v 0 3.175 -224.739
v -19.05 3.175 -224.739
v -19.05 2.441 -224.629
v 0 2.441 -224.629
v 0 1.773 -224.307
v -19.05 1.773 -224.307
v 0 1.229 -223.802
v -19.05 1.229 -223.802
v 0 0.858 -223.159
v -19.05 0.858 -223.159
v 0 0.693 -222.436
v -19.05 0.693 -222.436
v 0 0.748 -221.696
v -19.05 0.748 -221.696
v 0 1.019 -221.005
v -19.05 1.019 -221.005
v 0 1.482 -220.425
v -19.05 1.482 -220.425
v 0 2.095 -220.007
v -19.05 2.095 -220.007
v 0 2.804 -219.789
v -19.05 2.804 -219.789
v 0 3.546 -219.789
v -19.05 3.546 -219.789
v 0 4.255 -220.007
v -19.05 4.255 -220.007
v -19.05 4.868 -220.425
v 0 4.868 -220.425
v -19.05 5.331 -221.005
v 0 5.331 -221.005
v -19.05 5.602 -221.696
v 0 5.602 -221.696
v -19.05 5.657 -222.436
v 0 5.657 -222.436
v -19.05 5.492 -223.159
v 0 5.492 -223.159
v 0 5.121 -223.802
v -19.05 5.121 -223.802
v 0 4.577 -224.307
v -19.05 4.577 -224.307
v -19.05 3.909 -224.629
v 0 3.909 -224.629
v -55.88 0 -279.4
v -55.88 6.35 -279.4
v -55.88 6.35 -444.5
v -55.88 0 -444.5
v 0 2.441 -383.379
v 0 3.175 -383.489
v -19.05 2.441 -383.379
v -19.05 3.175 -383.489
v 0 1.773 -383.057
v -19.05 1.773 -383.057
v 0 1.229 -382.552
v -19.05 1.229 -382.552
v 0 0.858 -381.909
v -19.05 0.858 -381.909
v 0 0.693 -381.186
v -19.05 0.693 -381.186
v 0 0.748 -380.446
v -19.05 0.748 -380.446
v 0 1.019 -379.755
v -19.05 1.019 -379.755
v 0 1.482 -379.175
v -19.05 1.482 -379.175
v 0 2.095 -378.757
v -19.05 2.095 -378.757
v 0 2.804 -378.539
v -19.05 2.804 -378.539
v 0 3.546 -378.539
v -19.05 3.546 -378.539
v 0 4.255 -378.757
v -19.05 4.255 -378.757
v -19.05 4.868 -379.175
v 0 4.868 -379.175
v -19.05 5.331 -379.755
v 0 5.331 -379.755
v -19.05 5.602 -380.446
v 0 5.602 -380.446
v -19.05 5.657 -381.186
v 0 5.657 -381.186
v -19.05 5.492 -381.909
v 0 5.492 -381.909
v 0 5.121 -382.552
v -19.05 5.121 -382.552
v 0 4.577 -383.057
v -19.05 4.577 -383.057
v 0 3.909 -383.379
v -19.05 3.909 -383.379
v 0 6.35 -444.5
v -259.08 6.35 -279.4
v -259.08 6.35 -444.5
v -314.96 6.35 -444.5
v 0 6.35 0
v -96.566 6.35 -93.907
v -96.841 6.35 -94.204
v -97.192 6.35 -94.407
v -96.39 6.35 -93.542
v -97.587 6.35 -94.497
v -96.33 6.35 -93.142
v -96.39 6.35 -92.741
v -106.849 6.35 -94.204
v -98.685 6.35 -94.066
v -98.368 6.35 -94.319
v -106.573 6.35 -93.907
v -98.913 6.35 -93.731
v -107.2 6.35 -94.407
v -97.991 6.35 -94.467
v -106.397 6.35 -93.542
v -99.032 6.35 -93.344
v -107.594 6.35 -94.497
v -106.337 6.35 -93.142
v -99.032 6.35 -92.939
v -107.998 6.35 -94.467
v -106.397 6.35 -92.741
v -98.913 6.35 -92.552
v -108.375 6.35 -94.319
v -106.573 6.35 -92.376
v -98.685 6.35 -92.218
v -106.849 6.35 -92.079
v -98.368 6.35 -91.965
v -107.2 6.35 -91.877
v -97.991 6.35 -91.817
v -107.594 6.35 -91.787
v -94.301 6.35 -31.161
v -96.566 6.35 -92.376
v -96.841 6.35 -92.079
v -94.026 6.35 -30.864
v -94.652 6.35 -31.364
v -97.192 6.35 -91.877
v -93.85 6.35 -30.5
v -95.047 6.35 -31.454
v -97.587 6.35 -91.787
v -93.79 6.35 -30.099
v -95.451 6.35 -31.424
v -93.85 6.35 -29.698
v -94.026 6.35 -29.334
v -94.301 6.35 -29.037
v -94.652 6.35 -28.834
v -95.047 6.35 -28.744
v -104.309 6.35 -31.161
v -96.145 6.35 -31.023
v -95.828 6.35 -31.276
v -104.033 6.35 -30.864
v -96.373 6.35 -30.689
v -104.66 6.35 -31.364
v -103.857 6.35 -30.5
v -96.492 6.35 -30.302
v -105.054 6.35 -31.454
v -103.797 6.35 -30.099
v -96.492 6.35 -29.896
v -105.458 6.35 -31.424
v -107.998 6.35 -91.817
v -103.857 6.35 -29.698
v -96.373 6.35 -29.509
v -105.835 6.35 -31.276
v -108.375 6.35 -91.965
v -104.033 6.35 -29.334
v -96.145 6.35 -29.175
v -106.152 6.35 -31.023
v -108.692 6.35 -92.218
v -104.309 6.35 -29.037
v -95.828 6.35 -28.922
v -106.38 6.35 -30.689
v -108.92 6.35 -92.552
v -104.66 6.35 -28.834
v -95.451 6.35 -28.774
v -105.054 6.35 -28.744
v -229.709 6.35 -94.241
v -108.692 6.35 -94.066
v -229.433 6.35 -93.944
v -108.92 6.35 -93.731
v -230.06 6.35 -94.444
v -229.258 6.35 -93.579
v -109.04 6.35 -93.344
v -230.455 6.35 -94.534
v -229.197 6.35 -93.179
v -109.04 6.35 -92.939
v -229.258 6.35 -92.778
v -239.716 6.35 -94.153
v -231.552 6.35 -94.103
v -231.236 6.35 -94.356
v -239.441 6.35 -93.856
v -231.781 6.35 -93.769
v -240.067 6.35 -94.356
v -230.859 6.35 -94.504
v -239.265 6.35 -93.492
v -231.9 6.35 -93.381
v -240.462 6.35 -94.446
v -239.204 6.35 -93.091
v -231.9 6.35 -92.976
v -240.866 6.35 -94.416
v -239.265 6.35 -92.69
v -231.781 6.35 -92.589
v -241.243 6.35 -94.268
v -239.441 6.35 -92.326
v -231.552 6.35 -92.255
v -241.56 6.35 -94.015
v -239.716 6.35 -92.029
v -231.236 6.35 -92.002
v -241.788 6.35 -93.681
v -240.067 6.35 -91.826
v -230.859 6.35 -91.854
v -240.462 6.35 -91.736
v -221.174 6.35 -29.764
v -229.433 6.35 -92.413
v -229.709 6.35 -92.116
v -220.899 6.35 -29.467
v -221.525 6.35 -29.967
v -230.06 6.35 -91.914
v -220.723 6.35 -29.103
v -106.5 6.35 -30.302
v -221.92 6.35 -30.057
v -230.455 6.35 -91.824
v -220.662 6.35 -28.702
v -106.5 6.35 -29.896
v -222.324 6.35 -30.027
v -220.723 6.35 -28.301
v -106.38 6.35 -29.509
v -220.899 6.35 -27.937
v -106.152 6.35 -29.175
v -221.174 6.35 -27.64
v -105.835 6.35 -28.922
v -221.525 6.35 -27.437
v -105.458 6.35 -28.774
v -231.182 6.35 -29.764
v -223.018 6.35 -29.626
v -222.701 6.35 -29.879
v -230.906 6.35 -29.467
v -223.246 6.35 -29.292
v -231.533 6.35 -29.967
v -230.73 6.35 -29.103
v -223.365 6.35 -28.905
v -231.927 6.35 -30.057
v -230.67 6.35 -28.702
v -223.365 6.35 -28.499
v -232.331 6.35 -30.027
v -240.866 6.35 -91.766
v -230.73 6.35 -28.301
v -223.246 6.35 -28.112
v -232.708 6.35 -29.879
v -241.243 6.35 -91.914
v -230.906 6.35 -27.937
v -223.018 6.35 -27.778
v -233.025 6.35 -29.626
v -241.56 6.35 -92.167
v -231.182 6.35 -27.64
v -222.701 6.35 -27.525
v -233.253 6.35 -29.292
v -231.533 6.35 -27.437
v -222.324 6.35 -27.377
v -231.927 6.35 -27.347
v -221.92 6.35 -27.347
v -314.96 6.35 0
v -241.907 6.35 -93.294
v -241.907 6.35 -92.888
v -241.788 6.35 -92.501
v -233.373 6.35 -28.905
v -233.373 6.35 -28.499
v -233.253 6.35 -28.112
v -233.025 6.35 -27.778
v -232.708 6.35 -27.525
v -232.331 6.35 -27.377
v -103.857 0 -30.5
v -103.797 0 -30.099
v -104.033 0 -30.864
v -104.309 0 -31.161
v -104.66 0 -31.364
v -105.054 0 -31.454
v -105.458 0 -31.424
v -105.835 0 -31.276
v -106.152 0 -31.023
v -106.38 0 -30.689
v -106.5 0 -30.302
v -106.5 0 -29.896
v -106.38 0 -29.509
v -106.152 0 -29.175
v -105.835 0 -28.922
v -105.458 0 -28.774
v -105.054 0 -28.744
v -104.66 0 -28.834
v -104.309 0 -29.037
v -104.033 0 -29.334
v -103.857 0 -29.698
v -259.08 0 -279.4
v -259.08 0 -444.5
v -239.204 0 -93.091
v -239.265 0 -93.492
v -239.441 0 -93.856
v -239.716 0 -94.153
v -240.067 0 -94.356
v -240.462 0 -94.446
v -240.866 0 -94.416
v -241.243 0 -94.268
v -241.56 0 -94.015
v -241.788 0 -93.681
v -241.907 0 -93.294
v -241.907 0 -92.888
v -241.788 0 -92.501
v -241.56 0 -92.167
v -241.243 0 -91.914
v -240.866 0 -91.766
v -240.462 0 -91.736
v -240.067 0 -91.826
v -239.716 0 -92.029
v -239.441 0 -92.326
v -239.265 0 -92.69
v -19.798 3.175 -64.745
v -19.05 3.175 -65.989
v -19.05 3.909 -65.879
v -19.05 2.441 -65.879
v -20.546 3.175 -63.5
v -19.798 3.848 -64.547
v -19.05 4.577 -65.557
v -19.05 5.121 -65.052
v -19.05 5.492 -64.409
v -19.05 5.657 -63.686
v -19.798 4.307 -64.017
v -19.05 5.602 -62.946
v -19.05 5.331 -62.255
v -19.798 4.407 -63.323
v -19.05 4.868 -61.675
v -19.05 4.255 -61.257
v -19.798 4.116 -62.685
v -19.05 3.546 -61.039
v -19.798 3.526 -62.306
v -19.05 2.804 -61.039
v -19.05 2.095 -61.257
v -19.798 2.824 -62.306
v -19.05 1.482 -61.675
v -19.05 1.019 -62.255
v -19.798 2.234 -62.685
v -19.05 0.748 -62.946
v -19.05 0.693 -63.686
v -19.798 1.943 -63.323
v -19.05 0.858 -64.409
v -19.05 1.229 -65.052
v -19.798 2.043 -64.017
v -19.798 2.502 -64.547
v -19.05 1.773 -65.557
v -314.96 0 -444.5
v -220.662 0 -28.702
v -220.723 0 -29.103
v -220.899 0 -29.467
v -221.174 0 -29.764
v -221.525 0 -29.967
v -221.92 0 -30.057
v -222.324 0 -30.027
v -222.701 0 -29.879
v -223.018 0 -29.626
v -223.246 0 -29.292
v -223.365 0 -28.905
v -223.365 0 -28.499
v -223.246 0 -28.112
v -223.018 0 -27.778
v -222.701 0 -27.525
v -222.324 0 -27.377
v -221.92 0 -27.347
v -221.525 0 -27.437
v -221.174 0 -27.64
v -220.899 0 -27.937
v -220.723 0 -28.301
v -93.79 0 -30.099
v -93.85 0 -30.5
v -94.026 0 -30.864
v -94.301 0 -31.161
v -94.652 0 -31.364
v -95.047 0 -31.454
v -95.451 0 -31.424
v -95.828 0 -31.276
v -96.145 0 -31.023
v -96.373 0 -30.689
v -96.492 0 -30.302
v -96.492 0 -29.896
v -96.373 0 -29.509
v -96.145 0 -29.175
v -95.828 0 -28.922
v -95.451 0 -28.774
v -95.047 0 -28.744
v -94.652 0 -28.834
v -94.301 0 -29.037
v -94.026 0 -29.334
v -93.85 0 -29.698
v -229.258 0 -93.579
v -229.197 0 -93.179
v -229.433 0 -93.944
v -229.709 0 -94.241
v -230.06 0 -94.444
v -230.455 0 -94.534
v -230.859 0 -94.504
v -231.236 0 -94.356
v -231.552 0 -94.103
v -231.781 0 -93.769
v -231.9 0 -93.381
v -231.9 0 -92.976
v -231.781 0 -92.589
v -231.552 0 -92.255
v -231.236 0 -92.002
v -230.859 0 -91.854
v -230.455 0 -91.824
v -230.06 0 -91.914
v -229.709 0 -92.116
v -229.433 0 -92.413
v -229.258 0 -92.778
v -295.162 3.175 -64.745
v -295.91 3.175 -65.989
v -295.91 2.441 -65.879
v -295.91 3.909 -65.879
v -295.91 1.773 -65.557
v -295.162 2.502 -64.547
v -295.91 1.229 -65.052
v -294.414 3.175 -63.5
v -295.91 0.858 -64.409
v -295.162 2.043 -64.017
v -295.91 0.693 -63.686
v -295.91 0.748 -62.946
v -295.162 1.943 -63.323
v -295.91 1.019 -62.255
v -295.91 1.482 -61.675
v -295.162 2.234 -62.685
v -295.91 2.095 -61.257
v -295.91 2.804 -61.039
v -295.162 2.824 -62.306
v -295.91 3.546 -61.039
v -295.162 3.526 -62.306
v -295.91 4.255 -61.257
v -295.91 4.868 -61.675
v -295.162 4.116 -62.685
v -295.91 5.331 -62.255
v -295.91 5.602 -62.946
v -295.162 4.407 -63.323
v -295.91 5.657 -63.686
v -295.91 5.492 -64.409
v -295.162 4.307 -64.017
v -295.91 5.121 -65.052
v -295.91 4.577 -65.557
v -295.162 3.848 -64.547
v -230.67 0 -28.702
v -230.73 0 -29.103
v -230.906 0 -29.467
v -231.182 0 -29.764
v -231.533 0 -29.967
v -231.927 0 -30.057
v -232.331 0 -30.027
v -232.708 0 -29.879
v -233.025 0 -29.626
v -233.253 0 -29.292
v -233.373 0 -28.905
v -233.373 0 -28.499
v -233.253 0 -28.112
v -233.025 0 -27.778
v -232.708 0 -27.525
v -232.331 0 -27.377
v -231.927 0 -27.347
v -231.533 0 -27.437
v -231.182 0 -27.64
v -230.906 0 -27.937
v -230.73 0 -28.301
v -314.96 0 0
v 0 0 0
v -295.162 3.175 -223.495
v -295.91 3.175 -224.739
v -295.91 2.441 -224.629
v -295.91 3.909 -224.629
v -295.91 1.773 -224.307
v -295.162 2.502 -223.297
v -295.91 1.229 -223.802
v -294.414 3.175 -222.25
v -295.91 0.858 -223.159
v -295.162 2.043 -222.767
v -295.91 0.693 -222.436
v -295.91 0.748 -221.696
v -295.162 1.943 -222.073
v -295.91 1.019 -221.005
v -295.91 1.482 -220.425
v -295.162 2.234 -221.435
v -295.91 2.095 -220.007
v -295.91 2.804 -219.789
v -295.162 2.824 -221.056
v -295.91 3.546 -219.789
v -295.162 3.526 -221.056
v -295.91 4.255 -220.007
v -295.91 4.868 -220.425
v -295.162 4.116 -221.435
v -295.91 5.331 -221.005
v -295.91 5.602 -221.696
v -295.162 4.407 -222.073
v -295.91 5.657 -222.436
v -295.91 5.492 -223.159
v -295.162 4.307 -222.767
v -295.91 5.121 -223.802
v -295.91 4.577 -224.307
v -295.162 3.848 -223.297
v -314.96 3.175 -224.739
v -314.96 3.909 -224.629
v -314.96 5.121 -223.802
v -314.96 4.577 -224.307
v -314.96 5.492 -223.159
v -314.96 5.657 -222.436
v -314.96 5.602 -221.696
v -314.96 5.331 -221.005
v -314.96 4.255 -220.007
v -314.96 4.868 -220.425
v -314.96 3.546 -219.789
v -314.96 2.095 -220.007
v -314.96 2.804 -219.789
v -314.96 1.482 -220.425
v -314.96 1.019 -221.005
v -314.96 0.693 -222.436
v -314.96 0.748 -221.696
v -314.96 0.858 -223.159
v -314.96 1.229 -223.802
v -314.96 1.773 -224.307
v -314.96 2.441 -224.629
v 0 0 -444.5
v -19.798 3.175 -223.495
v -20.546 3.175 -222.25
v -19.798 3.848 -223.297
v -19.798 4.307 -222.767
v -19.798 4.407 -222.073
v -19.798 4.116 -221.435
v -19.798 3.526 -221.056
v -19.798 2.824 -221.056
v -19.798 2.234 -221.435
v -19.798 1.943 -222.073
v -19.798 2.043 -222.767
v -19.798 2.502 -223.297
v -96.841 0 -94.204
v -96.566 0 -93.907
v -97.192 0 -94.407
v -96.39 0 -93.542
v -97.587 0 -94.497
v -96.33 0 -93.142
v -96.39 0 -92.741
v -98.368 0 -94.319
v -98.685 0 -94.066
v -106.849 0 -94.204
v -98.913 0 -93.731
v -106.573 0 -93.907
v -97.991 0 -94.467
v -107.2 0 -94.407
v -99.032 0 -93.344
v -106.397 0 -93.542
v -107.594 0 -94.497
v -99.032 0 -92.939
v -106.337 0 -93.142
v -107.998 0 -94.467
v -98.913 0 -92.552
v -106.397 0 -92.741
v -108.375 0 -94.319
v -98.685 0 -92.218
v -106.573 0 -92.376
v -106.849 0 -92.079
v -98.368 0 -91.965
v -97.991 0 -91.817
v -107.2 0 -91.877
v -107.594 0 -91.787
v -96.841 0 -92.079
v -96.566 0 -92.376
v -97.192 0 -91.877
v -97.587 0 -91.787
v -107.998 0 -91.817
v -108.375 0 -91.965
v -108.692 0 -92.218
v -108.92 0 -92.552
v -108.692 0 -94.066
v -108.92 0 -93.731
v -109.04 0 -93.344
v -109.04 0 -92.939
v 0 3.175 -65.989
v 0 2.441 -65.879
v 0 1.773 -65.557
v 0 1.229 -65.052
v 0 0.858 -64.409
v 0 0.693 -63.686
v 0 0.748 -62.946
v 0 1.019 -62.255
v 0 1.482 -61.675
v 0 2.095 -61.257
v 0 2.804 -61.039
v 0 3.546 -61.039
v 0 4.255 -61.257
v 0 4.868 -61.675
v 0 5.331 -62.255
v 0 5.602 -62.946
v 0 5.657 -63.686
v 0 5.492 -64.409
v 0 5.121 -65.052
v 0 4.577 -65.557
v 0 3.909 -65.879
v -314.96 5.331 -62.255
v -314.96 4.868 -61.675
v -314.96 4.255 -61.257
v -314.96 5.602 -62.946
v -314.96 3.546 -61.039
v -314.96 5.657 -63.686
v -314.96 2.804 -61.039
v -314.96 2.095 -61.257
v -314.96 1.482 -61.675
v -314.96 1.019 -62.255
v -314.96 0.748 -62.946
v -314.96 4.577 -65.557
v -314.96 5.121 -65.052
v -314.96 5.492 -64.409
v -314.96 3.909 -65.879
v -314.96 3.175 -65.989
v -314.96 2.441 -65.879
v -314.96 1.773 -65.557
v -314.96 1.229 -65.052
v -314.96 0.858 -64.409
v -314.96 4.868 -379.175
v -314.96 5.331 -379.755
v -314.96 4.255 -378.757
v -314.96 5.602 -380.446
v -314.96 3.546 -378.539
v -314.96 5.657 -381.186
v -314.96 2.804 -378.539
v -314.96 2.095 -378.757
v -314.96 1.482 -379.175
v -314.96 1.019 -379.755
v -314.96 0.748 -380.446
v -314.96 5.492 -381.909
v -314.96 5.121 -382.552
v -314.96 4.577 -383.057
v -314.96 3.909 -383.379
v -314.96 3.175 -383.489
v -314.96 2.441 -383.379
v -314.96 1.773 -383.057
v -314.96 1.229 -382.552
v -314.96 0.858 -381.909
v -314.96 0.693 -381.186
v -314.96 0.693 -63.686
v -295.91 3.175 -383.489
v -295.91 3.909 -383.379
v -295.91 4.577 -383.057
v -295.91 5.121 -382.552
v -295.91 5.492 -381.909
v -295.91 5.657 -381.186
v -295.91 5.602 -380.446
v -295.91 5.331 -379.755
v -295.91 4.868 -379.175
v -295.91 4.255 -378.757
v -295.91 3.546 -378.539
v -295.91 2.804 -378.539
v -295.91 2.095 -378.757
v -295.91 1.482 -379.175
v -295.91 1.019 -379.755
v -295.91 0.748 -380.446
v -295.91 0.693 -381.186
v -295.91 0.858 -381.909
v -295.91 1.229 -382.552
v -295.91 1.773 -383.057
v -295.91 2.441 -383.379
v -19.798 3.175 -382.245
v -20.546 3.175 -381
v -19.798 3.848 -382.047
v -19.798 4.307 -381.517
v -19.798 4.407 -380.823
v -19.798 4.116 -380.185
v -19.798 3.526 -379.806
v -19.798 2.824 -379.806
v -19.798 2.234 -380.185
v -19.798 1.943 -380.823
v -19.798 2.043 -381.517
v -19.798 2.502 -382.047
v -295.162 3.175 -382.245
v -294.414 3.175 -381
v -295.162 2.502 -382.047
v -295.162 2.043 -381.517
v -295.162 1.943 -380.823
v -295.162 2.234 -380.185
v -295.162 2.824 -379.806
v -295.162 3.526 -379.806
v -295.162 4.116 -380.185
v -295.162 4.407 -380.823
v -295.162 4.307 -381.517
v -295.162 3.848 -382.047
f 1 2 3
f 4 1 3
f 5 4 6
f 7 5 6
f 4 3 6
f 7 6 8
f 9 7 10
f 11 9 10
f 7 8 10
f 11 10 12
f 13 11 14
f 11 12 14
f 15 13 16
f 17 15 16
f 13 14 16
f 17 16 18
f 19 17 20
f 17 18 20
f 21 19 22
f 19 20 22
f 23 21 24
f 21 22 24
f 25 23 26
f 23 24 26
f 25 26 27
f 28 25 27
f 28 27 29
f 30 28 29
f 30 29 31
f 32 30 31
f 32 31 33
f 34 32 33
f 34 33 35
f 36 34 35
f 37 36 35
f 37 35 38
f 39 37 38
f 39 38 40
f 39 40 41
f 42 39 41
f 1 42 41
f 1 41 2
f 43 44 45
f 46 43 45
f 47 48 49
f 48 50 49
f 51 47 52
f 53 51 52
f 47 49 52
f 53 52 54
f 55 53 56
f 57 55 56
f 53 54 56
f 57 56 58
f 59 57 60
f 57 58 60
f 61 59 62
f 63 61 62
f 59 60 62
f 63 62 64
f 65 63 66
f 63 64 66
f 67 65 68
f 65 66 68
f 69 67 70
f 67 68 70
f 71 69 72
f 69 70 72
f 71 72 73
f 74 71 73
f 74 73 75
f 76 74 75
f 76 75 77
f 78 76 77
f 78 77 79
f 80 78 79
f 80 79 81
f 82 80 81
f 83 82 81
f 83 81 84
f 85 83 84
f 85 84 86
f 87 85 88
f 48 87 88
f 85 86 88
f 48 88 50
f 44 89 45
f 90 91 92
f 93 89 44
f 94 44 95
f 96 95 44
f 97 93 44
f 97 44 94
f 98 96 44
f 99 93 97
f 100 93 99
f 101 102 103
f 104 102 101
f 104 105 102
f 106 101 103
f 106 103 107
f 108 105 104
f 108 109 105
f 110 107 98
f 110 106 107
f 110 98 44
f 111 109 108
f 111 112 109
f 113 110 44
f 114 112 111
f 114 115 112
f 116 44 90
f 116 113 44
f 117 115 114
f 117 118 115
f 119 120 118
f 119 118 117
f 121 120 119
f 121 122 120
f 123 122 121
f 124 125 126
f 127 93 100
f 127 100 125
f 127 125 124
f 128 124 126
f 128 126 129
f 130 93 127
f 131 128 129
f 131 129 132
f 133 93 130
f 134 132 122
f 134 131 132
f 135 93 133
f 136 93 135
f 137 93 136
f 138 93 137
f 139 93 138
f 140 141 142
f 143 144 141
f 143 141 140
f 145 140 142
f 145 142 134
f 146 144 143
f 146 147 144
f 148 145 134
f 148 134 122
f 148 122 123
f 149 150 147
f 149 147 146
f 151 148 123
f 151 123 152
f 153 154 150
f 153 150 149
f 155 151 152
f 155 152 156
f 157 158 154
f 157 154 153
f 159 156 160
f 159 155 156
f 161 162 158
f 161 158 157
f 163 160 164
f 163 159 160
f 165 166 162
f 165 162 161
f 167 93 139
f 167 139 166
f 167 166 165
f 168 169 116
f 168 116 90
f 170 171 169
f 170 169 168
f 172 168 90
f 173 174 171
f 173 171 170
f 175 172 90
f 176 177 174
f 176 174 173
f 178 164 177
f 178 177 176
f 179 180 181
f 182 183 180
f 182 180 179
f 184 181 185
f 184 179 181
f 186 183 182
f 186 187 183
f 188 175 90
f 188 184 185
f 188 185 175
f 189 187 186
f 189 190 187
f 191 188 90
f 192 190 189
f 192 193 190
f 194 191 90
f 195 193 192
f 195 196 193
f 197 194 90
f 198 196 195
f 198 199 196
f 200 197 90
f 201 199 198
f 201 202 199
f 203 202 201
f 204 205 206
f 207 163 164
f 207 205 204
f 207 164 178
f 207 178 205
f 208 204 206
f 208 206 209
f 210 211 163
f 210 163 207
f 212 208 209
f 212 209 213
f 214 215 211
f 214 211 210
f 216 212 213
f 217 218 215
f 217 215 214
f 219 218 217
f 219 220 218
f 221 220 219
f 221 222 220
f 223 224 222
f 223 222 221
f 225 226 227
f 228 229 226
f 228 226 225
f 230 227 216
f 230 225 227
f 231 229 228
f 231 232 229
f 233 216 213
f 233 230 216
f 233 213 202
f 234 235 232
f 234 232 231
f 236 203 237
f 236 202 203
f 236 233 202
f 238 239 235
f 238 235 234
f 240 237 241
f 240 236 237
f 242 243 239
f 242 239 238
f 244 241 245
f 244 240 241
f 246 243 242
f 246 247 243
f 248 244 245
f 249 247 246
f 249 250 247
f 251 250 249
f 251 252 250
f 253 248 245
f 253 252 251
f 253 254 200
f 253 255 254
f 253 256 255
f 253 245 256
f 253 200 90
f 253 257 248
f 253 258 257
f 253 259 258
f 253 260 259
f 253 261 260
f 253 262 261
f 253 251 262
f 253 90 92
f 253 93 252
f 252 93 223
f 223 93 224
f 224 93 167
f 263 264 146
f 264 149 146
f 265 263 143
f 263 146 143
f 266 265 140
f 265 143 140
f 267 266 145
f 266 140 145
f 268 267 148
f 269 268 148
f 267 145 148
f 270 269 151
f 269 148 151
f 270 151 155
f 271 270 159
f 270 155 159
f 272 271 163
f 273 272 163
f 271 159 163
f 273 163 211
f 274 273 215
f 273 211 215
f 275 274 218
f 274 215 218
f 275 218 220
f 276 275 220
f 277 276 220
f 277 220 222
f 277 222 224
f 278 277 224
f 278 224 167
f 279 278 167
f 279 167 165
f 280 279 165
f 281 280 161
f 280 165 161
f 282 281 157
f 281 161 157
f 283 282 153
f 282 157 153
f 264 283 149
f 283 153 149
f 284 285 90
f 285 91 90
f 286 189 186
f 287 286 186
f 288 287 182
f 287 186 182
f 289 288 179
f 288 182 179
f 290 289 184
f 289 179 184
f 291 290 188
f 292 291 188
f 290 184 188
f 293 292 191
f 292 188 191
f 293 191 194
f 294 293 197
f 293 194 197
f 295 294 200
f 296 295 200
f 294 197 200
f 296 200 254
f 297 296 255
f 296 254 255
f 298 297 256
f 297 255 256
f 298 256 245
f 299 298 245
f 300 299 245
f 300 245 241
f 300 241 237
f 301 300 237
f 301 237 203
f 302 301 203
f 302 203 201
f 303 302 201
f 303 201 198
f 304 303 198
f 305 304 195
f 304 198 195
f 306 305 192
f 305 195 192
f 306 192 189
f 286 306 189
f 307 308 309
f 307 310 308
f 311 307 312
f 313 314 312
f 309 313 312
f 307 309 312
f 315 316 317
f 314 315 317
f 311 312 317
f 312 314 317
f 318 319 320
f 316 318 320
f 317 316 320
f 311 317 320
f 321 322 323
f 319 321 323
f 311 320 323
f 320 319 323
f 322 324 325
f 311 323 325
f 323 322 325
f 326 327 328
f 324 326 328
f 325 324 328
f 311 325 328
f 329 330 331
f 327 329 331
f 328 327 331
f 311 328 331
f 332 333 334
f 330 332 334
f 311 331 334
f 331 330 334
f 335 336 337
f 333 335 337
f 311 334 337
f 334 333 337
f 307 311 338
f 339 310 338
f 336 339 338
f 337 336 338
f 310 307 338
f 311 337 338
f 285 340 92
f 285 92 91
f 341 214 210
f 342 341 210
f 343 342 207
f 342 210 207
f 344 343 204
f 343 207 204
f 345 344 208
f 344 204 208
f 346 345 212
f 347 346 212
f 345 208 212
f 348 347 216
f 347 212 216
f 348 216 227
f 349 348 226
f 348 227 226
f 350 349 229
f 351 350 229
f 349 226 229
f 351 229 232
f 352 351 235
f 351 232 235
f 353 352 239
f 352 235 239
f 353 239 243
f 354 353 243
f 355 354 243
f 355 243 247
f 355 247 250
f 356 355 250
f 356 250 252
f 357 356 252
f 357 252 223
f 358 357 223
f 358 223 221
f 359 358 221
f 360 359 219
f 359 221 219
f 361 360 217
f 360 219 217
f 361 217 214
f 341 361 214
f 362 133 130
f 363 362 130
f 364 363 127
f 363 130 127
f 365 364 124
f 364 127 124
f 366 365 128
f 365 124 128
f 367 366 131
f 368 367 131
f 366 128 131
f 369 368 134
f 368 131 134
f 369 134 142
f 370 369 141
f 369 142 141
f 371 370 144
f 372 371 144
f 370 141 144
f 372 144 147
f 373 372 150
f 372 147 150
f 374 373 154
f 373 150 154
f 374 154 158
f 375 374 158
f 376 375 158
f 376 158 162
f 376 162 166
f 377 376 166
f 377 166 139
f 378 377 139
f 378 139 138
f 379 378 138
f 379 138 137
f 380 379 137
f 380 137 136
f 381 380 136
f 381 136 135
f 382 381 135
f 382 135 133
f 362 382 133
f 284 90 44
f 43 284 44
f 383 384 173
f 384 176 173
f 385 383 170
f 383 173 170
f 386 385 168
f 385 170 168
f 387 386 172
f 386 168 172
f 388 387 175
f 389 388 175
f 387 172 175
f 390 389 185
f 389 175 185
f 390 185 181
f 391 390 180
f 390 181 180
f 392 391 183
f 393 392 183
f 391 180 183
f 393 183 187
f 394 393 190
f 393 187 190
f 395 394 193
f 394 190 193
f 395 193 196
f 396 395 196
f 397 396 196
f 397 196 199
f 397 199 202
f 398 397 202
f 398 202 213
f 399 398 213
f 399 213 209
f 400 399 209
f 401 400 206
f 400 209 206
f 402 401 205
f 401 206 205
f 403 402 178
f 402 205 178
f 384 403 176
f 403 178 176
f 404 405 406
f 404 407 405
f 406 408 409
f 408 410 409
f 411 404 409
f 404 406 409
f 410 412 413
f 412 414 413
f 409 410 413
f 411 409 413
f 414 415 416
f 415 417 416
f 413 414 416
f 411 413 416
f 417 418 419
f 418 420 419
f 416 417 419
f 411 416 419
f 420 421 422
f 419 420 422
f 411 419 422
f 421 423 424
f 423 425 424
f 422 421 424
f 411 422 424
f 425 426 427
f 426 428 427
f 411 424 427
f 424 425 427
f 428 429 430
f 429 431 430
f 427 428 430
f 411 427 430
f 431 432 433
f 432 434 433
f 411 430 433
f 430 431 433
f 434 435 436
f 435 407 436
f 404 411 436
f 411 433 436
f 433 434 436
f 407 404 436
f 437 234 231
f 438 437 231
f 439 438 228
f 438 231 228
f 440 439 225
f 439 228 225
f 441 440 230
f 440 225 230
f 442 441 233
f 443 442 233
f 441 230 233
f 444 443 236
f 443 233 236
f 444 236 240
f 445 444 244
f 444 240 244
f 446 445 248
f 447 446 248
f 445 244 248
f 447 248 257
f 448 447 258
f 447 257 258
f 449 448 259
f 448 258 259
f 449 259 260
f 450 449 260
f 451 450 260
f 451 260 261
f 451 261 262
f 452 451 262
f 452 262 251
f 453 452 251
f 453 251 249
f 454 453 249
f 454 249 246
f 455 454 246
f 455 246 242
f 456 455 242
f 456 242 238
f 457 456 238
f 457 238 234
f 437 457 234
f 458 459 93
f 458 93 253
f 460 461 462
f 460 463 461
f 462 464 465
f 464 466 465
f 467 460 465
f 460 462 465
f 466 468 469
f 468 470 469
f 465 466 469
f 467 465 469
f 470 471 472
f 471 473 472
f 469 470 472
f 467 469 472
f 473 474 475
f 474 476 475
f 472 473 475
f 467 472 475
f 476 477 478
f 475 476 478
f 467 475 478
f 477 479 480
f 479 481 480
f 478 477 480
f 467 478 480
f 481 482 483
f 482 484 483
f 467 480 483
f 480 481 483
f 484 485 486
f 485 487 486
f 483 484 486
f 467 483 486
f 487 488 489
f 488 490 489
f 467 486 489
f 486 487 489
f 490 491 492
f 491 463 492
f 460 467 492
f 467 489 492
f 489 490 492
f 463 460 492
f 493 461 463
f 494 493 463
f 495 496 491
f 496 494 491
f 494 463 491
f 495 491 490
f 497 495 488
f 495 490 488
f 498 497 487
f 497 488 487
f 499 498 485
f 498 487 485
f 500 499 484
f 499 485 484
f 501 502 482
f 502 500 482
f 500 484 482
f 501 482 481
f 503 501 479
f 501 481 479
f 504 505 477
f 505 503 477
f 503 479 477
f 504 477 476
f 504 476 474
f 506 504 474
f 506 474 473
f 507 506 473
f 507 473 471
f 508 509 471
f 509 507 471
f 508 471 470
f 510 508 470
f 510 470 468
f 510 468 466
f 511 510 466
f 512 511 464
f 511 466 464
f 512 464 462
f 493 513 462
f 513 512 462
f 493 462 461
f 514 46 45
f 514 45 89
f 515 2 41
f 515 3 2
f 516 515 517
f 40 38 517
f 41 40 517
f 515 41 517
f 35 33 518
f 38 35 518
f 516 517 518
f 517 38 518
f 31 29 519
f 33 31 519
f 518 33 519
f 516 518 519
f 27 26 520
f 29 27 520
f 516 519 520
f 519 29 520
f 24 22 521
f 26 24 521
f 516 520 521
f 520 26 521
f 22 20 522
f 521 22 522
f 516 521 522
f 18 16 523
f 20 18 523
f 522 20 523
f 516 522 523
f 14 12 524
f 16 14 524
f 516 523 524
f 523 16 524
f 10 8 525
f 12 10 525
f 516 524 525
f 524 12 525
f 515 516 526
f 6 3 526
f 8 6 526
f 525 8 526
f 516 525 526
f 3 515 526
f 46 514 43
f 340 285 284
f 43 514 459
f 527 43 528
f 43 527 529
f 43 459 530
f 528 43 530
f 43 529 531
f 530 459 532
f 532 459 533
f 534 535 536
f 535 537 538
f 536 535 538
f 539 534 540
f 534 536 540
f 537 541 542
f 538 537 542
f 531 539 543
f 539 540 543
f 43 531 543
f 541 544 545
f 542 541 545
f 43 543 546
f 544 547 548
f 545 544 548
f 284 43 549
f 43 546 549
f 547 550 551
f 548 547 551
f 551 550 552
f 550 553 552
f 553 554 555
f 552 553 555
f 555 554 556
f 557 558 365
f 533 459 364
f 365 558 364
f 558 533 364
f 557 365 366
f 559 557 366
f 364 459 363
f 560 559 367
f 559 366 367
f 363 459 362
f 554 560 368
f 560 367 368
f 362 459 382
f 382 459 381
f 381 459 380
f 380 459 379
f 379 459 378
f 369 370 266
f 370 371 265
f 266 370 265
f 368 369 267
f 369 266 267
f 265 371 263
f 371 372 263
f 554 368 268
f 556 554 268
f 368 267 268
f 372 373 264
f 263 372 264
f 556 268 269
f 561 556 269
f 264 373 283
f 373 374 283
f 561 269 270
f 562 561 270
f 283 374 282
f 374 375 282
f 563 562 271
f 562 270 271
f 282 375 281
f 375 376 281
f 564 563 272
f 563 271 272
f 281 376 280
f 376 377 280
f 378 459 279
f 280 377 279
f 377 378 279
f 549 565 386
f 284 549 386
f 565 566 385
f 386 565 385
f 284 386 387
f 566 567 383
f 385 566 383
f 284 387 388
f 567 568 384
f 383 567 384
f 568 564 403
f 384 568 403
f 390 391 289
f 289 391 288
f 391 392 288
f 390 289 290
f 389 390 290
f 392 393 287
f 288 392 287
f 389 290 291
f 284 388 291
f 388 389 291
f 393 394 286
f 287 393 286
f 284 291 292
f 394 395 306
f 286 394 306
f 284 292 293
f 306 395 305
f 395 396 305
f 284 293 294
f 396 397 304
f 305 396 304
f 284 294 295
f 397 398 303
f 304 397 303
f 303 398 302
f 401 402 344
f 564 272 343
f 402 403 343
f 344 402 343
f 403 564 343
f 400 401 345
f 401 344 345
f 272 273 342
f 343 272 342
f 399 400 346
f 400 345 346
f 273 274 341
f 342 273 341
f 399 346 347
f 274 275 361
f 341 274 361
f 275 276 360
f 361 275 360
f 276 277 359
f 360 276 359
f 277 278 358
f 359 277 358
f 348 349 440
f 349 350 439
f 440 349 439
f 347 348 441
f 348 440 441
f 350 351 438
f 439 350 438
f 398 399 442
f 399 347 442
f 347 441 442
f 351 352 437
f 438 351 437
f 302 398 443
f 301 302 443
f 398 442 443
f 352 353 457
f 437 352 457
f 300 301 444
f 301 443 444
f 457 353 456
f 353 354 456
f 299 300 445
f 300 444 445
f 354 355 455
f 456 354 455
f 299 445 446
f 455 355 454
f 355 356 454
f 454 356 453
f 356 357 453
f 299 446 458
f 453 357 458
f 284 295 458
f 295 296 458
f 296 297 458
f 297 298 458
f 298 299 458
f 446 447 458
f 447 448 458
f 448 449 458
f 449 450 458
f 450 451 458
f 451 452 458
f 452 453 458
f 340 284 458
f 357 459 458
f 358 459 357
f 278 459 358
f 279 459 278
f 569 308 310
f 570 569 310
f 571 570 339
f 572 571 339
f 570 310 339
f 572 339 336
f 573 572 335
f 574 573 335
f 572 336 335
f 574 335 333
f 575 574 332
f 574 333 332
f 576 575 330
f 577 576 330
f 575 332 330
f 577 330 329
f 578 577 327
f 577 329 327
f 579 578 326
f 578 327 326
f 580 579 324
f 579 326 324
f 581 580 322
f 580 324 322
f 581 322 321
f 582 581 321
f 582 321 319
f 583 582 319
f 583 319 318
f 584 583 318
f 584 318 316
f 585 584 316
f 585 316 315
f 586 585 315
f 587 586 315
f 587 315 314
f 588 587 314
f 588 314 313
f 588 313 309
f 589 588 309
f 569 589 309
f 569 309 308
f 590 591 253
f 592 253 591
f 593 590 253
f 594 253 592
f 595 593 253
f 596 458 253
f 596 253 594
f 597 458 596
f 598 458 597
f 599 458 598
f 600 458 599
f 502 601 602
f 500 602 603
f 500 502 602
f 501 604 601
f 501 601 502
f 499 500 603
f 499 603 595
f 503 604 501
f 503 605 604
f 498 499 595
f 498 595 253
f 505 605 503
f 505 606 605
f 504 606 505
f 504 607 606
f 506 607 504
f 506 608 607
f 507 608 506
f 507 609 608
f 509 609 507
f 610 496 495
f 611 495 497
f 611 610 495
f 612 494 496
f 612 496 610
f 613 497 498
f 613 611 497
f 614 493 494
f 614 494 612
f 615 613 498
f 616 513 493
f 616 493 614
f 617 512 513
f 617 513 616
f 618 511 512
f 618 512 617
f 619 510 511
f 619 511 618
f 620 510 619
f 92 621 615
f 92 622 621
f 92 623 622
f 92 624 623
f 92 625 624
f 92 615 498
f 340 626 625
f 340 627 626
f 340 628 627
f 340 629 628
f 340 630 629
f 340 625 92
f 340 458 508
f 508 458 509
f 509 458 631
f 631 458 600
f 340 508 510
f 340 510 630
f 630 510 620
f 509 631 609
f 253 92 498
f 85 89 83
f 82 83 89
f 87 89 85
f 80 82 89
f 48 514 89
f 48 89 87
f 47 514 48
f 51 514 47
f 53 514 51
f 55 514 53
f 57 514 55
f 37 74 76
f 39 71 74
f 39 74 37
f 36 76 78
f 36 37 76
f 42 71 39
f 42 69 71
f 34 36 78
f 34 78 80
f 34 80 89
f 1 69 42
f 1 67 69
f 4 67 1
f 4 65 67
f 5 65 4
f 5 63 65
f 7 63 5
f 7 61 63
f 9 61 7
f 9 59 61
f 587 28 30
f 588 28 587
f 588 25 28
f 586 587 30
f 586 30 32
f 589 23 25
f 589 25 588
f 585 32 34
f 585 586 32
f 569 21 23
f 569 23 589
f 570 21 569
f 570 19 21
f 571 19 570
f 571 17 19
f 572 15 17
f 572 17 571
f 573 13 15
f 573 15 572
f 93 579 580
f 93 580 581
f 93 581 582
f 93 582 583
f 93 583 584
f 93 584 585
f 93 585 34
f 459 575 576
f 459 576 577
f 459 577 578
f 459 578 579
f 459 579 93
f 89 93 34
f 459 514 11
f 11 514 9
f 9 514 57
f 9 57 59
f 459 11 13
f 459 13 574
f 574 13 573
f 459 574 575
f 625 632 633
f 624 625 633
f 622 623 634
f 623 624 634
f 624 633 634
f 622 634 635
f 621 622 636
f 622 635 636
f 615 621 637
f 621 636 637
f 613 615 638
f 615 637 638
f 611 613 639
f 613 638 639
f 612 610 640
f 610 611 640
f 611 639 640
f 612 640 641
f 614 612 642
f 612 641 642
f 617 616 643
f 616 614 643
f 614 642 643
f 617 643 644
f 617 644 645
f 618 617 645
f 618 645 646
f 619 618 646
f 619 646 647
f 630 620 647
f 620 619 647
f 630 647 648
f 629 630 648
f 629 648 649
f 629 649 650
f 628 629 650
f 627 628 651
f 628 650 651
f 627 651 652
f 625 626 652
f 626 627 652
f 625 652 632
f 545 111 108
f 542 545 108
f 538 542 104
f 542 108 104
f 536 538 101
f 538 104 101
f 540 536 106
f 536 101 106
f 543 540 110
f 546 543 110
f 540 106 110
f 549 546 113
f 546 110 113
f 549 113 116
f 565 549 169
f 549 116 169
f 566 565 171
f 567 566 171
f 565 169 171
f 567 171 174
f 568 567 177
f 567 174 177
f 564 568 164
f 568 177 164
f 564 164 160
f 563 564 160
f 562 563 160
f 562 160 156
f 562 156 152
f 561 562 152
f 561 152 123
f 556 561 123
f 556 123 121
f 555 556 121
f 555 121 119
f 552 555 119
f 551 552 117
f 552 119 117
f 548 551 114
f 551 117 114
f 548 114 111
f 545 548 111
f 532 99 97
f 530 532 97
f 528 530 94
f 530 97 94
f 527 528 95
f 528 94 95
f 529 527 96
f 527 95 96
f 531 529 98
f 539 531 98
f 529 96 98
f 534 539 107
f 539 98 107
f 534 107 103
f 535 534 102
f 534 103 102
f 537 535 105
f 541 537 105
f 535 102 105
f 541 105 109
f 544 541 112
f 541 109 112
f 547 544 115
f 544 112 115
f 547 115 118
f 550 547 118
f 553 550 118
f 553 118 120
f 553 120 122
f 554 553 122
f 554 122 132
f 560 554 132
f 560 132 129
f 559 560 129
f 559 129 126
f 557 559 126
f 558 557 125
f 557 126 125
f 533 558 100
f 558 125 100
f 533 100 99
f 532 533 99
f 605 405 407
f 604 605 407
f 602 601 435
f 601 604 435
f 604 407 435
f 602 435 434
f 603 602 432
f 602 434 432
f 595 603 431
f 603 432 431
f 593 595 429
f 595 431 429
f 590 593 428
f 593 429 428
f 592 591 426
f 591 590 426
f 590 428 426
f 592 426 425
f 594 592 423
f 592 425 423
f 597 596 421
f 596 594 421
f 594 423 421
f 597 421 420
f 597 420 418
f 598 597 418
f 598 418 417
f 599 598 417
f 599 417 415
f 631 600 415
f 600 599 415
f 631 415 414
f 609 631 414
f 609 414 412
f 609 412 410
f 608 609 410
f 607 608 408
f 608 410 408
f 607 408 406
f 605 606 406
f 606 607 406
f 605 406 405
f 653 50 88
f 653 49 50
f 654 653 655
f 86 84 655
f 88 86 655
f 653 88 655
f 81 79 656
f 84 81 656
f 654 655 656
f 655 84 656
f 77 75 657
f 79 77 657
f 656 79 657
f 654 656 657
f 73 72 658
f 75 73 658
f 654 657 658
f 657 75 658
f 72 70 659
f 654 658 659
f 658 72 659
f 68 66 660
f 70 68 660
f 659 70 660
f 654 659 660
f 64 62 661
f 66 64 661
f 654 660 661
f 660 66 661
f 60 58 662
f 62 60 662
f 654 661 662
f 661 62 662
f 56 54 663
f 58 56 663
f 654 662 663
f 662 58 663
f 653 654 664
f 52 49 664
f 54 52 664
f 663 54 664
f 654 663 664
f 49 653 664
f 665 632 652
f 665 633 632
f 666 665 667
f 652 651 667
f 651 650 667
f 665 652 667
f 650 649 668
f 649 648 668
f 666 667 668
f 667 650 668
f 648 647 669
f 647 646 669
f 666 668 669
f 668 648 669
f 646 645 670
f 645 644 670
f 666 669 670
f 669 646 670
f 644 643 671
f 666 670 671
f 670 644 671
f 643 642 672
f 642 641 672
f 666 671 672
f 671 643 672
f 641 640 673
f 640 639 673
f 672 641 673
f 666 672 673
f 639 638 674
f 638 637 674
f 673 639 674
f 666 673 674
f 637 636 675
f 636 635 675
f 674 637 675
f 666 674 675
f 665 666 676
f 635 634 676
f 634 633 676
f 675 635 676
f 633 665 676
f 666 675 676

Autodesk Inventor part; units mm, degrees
ref_plane "YZ Plane" through (0, 0, 0) normal (1, 0, 0) x (0, 1, 0)
ref_plane "XZ Plane" through (0, 0, 0) normal (0, 1, 0) x (-1, 0, 0)
ref_plane "XY Plane" through (0, 0, 0) normal (0, 0, 1) x (1, 0, 0)
sketch "Sketch1" plane through (0, 0, 0) normal (0, 1, 0) x (-1, 0, 0)
  line L0 (0, 0) -> (314.96, 0)
  line L1 (314.96, 0) -> (314.96, -444.5)
  line L2 (314.96, -444.5) -> (0, -444.5)
  line L3 (0, -444.5) -> (0, 0)
  dimension "d0" = 314.96
  dimension "d1" = 444.5
extrude "Extrusion1" add sketch "Sketch1" along normal blind 6.35
sketch "Sketch2" plane through (0, 6.35, 0) normal (0, 1, 0) x (1, 0, 0)
  circle A0 centre (-95.1484, 30.099) radius 1.3589
  circle A1 centre (-105.156, 30.099) radius 1.3589
  line L0 (-314.96, 0) -> (0, 0) projected
  line L1 (0, 0) -> (0, 444.5) projected
  dimension "d4" = 2.7178
  dimension "d5" = 2.7178
  dimension "d7" = 95.1484
  dimension "d8" = 10.0076
  dimension "d9" = 30.099
  dimension "d37" = 30.099
extrude "Extrusion2" cut sketch "Sketch2" against normal blind 25.4
sketch "Sketch3" plane through (0, 6.35, 0) normal (0, 1, 0) x (1, 0, 0)
  circle A0 centre (-107.696, 93.1418) radius 1.3589
  circle A1 centre (-97.6884, 93.1418) radius 1.3589
  circle A2 centre (-95.1484, 30.099) radius 1.3589 projected
  circle A3 centre (-105.156, 30.099) radius 1.3589 projected
  line L0 (0, 0) -> (0, 444.5) projected
  dimension "d12" = 2.7178
  dimension "d13" = 2.7178
  dimension "d14" = 63.0428
  dimension "d15" = 63.0428
  dimension "d16" = 10.0076
  dimension "d17" = 97.6884
extrude "Extrusion3" cut sketch "Sketch3" against normal blind 25.4 contours A0 | A1
sketch "Sketch4" plane through (0, 6.35, 0) normal (0, 1, 0) x (1, 0, 0)
  circle A0 centre (-240.5634, 93.091) radius 1.3589
  circle A1 centre (-230.5562, 93.1789) radius 1.3589
  line L0 (-314.96, 444.5) -> (-314.96, 0) projected
  line L1 (-314.96, 0) -> (0, 0) projected
  dimension "d20" = 2.7178
  dimension "d21" = 2.7178
  dimension "d22" = 10.0076
  dimension "d23" = 74.3966
  dimension "d24" = 93.091
extrude "Extrusion4" cut sketch "Sketch4" against normal blind 25.4
sketch "Sketch5" plane through (0, 6.35, 0) normal (0, 1, 0) x (1, 0, 0)
  circle A0 centre (-232.029, 28.702) radius 1.3589
  circle A1 centre (-222.0214, 28.702) radius 1.3589
  line L0 (-314.96, 0) -> (0, 0) projected
  line L1 (-314.96, 444.5) -> (-314.96, 0) projected
  line L2 (0, 0) -> (0, 444.5) projected
  dimension "d27" = 2.7178
  dimension "d28" = 2.7178
  dimension "d31" = 28.702
  dimension "d32" = 10.0076
  dimension "d36" = 222.0214
  dimension "d38" = 28.702
extrude "Extrusion5" cut sketch "Sketch5" against normal blind 25.4
sketch "Sketch6" plane through (0, 0, 0) normal (1, 0, 0) x (0, 0, -1)
  line L0 (444.5, 0) -> (444.5, 6.35) projected
  line L1 (0, 6.35) -> (444.5, 6.35) projected
  line L2 (0, 0) -> (0, 6.35) projected
  point P0 (63.5, 3.175)
  point P1 (222.25, 3.175)
  point P2 (381, 3.175)
  dimension "d39" = 6.35
  dimension "d40" = 3.175
  dimension "d41" = 3.175
  dimension "d42" = 3.175
  dimension "d43" = 63.5
  dimension "d44" = 63.5
  dimension "d45" = 317.5
  dimension "d46" = 158.75
hole "Hole1" at (0, 3.175, -63.5) at (0, 3.175, -222.25) at (0, 3.175, -381) direction (-1, 0, 0) diameter 4.9784 depth 19.05 tip angle 118 thread size "1/4-20 UNC" class "2B" standard "ANSI Unified Screw Threads"
ref_plane "Work Plane1" through (-157.48, 0, 0) normal (1, 0, 0) x (0, 0, -1)
mirror "Mirror1" about plane through (-157.48, 0, 0) normal (1, 0, 0) of "Hole1"
sketch "Sketch7" plane through (0, 6.35, 0) normal (0, 1, 0) x (1, 0, 0)
  line L0 (0, 444.5) -> (-314.96, 444.5) projected
  line L1 (-55.88, 444.5) -> (-259.08, 444.5)
  line L2 (-259.08, 444.5) -> (-259.08, 279.4)
  line L3 (-259.08, 279.4) -> (-55.88, 279.4)
  line L4 (-55.88, 279.4) -> (-55.88, 444.5)
  line L5 (-314.96, 444.5) -> (-314.96, 0) projected
  point P0 (0, 0)
  dimension "d54" = 203.2
  dimension "d55" = 165.1
  dimension "d56" = 55.88
extrude "Extrusion6" cut sketch "Sketch7" against normal through all
equation "\"d40\" = 0.5 * d39"
equation "\"d41\" = d40"
equation "\"d42\" = d41"
equation "\"d44\" = d43"
equation "\"d46\" = 0.5 * d45"
properties part number "main plate"
